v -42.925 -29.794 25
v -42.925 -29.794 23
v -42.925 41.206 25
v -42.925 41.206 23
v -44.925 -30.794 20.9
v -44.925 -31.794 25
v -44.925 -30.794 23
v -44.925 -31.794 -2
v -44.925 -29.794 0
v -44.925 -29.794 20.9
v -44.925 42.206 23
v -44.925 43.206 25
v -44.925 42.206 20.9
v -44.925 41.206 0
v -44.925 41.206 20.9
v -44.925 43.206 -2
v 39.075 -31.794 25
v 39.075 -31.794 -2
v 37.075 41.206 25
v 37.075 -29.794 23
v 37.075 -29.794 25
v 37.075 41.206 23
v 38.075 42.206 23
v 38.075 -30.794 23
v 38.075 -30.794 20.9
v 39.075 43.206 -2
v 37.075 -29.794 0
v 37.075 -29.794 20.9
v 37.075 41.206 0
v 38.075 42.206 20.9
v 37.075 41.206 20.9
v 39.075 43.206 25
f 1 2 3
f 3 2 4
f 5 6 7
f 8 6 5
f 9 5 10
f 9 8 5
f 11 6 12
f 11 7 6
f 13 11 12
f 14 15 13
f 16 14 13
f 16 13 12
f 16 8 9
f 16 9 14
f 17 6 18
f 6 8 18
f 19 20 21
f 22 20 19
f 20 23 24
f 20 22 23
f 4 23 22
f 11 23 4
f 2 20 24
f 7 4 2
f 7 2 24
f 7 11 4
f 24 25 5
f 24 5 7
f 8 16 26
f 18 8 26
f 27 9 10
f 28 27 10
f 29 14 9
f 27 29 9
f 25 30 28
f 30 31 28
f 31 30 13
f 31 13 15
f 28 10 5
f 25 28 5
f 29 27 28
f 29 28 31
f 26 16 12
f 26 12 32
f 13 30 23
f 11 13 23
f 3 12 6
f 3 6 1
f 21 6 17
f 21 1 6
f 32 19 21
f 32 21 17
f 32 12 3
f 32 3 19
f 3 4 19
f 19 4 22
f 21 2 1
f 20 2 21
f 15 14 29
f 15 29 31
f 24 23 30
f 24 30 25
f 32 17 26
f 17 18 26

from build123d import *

# Parameters (mm, degrees)
F0_W     = 84
F0_H     = 75
F1_DEPTH = 2
F2_W     = 84
F2_H     = 75
F2_W_2   = 80
F2_H_2   = 71
F3_DEPTH = 25
F4_W     = 73
F4_H     = 2.1
F5_DEPTH = 83
F6_W     = 71
F6_H     = 20.9
F7_DEPTH = 2


with BuildPart() as f1:
    # F0 (on Top) → F1 (new body)
    with BuildSketch(Plane.XY):
        with Locations((-2.925097, 5.706407)):
            Rectangle(F0_W, F0_H)
    extrude(amount=-F1_DEPTH)

    # F2 (on face) → F3 (join)
    with BuildSketch(Plane.XY):
        with Locations((-2.925097, 5.706407)):
            Rectangle(F2_W, F2_H)
        with Locations((-2.925097, 5.706407)):
            Rectangle(F2_W_2, F2_H_2, mode=Mode.SUBTRACT)
    extrude(amount=F3_DEPTH)

    # F4 (on face) → F5 (cut)
    with BuildSketch(Plane(origin=(-44.925097, 0, 0), x_dir=(0, -1, 0), z_dir=(-1, 0, 0))):
        with Locations((-5.706407, 21.95)):
            Rectangle(F4_W, F4_H)
    extrude(amount=-F5_DEPTH, mode=Mode.SUBTRACT)

    # F6 (on face) → F7 (cut)
    with BuildSketch(Plane(origin=(-44.925097, 0, 0), x_dir=(0, -1, 0), z_dir=(-1, 0, 0))):
        with Locations((-5.706407, 10.45)):
            Rectangle(F6_W, F6_H)
    extrude(amount=-F7_DEPTH, mode=Mode.SUBTRACT)


solid = f1.part
